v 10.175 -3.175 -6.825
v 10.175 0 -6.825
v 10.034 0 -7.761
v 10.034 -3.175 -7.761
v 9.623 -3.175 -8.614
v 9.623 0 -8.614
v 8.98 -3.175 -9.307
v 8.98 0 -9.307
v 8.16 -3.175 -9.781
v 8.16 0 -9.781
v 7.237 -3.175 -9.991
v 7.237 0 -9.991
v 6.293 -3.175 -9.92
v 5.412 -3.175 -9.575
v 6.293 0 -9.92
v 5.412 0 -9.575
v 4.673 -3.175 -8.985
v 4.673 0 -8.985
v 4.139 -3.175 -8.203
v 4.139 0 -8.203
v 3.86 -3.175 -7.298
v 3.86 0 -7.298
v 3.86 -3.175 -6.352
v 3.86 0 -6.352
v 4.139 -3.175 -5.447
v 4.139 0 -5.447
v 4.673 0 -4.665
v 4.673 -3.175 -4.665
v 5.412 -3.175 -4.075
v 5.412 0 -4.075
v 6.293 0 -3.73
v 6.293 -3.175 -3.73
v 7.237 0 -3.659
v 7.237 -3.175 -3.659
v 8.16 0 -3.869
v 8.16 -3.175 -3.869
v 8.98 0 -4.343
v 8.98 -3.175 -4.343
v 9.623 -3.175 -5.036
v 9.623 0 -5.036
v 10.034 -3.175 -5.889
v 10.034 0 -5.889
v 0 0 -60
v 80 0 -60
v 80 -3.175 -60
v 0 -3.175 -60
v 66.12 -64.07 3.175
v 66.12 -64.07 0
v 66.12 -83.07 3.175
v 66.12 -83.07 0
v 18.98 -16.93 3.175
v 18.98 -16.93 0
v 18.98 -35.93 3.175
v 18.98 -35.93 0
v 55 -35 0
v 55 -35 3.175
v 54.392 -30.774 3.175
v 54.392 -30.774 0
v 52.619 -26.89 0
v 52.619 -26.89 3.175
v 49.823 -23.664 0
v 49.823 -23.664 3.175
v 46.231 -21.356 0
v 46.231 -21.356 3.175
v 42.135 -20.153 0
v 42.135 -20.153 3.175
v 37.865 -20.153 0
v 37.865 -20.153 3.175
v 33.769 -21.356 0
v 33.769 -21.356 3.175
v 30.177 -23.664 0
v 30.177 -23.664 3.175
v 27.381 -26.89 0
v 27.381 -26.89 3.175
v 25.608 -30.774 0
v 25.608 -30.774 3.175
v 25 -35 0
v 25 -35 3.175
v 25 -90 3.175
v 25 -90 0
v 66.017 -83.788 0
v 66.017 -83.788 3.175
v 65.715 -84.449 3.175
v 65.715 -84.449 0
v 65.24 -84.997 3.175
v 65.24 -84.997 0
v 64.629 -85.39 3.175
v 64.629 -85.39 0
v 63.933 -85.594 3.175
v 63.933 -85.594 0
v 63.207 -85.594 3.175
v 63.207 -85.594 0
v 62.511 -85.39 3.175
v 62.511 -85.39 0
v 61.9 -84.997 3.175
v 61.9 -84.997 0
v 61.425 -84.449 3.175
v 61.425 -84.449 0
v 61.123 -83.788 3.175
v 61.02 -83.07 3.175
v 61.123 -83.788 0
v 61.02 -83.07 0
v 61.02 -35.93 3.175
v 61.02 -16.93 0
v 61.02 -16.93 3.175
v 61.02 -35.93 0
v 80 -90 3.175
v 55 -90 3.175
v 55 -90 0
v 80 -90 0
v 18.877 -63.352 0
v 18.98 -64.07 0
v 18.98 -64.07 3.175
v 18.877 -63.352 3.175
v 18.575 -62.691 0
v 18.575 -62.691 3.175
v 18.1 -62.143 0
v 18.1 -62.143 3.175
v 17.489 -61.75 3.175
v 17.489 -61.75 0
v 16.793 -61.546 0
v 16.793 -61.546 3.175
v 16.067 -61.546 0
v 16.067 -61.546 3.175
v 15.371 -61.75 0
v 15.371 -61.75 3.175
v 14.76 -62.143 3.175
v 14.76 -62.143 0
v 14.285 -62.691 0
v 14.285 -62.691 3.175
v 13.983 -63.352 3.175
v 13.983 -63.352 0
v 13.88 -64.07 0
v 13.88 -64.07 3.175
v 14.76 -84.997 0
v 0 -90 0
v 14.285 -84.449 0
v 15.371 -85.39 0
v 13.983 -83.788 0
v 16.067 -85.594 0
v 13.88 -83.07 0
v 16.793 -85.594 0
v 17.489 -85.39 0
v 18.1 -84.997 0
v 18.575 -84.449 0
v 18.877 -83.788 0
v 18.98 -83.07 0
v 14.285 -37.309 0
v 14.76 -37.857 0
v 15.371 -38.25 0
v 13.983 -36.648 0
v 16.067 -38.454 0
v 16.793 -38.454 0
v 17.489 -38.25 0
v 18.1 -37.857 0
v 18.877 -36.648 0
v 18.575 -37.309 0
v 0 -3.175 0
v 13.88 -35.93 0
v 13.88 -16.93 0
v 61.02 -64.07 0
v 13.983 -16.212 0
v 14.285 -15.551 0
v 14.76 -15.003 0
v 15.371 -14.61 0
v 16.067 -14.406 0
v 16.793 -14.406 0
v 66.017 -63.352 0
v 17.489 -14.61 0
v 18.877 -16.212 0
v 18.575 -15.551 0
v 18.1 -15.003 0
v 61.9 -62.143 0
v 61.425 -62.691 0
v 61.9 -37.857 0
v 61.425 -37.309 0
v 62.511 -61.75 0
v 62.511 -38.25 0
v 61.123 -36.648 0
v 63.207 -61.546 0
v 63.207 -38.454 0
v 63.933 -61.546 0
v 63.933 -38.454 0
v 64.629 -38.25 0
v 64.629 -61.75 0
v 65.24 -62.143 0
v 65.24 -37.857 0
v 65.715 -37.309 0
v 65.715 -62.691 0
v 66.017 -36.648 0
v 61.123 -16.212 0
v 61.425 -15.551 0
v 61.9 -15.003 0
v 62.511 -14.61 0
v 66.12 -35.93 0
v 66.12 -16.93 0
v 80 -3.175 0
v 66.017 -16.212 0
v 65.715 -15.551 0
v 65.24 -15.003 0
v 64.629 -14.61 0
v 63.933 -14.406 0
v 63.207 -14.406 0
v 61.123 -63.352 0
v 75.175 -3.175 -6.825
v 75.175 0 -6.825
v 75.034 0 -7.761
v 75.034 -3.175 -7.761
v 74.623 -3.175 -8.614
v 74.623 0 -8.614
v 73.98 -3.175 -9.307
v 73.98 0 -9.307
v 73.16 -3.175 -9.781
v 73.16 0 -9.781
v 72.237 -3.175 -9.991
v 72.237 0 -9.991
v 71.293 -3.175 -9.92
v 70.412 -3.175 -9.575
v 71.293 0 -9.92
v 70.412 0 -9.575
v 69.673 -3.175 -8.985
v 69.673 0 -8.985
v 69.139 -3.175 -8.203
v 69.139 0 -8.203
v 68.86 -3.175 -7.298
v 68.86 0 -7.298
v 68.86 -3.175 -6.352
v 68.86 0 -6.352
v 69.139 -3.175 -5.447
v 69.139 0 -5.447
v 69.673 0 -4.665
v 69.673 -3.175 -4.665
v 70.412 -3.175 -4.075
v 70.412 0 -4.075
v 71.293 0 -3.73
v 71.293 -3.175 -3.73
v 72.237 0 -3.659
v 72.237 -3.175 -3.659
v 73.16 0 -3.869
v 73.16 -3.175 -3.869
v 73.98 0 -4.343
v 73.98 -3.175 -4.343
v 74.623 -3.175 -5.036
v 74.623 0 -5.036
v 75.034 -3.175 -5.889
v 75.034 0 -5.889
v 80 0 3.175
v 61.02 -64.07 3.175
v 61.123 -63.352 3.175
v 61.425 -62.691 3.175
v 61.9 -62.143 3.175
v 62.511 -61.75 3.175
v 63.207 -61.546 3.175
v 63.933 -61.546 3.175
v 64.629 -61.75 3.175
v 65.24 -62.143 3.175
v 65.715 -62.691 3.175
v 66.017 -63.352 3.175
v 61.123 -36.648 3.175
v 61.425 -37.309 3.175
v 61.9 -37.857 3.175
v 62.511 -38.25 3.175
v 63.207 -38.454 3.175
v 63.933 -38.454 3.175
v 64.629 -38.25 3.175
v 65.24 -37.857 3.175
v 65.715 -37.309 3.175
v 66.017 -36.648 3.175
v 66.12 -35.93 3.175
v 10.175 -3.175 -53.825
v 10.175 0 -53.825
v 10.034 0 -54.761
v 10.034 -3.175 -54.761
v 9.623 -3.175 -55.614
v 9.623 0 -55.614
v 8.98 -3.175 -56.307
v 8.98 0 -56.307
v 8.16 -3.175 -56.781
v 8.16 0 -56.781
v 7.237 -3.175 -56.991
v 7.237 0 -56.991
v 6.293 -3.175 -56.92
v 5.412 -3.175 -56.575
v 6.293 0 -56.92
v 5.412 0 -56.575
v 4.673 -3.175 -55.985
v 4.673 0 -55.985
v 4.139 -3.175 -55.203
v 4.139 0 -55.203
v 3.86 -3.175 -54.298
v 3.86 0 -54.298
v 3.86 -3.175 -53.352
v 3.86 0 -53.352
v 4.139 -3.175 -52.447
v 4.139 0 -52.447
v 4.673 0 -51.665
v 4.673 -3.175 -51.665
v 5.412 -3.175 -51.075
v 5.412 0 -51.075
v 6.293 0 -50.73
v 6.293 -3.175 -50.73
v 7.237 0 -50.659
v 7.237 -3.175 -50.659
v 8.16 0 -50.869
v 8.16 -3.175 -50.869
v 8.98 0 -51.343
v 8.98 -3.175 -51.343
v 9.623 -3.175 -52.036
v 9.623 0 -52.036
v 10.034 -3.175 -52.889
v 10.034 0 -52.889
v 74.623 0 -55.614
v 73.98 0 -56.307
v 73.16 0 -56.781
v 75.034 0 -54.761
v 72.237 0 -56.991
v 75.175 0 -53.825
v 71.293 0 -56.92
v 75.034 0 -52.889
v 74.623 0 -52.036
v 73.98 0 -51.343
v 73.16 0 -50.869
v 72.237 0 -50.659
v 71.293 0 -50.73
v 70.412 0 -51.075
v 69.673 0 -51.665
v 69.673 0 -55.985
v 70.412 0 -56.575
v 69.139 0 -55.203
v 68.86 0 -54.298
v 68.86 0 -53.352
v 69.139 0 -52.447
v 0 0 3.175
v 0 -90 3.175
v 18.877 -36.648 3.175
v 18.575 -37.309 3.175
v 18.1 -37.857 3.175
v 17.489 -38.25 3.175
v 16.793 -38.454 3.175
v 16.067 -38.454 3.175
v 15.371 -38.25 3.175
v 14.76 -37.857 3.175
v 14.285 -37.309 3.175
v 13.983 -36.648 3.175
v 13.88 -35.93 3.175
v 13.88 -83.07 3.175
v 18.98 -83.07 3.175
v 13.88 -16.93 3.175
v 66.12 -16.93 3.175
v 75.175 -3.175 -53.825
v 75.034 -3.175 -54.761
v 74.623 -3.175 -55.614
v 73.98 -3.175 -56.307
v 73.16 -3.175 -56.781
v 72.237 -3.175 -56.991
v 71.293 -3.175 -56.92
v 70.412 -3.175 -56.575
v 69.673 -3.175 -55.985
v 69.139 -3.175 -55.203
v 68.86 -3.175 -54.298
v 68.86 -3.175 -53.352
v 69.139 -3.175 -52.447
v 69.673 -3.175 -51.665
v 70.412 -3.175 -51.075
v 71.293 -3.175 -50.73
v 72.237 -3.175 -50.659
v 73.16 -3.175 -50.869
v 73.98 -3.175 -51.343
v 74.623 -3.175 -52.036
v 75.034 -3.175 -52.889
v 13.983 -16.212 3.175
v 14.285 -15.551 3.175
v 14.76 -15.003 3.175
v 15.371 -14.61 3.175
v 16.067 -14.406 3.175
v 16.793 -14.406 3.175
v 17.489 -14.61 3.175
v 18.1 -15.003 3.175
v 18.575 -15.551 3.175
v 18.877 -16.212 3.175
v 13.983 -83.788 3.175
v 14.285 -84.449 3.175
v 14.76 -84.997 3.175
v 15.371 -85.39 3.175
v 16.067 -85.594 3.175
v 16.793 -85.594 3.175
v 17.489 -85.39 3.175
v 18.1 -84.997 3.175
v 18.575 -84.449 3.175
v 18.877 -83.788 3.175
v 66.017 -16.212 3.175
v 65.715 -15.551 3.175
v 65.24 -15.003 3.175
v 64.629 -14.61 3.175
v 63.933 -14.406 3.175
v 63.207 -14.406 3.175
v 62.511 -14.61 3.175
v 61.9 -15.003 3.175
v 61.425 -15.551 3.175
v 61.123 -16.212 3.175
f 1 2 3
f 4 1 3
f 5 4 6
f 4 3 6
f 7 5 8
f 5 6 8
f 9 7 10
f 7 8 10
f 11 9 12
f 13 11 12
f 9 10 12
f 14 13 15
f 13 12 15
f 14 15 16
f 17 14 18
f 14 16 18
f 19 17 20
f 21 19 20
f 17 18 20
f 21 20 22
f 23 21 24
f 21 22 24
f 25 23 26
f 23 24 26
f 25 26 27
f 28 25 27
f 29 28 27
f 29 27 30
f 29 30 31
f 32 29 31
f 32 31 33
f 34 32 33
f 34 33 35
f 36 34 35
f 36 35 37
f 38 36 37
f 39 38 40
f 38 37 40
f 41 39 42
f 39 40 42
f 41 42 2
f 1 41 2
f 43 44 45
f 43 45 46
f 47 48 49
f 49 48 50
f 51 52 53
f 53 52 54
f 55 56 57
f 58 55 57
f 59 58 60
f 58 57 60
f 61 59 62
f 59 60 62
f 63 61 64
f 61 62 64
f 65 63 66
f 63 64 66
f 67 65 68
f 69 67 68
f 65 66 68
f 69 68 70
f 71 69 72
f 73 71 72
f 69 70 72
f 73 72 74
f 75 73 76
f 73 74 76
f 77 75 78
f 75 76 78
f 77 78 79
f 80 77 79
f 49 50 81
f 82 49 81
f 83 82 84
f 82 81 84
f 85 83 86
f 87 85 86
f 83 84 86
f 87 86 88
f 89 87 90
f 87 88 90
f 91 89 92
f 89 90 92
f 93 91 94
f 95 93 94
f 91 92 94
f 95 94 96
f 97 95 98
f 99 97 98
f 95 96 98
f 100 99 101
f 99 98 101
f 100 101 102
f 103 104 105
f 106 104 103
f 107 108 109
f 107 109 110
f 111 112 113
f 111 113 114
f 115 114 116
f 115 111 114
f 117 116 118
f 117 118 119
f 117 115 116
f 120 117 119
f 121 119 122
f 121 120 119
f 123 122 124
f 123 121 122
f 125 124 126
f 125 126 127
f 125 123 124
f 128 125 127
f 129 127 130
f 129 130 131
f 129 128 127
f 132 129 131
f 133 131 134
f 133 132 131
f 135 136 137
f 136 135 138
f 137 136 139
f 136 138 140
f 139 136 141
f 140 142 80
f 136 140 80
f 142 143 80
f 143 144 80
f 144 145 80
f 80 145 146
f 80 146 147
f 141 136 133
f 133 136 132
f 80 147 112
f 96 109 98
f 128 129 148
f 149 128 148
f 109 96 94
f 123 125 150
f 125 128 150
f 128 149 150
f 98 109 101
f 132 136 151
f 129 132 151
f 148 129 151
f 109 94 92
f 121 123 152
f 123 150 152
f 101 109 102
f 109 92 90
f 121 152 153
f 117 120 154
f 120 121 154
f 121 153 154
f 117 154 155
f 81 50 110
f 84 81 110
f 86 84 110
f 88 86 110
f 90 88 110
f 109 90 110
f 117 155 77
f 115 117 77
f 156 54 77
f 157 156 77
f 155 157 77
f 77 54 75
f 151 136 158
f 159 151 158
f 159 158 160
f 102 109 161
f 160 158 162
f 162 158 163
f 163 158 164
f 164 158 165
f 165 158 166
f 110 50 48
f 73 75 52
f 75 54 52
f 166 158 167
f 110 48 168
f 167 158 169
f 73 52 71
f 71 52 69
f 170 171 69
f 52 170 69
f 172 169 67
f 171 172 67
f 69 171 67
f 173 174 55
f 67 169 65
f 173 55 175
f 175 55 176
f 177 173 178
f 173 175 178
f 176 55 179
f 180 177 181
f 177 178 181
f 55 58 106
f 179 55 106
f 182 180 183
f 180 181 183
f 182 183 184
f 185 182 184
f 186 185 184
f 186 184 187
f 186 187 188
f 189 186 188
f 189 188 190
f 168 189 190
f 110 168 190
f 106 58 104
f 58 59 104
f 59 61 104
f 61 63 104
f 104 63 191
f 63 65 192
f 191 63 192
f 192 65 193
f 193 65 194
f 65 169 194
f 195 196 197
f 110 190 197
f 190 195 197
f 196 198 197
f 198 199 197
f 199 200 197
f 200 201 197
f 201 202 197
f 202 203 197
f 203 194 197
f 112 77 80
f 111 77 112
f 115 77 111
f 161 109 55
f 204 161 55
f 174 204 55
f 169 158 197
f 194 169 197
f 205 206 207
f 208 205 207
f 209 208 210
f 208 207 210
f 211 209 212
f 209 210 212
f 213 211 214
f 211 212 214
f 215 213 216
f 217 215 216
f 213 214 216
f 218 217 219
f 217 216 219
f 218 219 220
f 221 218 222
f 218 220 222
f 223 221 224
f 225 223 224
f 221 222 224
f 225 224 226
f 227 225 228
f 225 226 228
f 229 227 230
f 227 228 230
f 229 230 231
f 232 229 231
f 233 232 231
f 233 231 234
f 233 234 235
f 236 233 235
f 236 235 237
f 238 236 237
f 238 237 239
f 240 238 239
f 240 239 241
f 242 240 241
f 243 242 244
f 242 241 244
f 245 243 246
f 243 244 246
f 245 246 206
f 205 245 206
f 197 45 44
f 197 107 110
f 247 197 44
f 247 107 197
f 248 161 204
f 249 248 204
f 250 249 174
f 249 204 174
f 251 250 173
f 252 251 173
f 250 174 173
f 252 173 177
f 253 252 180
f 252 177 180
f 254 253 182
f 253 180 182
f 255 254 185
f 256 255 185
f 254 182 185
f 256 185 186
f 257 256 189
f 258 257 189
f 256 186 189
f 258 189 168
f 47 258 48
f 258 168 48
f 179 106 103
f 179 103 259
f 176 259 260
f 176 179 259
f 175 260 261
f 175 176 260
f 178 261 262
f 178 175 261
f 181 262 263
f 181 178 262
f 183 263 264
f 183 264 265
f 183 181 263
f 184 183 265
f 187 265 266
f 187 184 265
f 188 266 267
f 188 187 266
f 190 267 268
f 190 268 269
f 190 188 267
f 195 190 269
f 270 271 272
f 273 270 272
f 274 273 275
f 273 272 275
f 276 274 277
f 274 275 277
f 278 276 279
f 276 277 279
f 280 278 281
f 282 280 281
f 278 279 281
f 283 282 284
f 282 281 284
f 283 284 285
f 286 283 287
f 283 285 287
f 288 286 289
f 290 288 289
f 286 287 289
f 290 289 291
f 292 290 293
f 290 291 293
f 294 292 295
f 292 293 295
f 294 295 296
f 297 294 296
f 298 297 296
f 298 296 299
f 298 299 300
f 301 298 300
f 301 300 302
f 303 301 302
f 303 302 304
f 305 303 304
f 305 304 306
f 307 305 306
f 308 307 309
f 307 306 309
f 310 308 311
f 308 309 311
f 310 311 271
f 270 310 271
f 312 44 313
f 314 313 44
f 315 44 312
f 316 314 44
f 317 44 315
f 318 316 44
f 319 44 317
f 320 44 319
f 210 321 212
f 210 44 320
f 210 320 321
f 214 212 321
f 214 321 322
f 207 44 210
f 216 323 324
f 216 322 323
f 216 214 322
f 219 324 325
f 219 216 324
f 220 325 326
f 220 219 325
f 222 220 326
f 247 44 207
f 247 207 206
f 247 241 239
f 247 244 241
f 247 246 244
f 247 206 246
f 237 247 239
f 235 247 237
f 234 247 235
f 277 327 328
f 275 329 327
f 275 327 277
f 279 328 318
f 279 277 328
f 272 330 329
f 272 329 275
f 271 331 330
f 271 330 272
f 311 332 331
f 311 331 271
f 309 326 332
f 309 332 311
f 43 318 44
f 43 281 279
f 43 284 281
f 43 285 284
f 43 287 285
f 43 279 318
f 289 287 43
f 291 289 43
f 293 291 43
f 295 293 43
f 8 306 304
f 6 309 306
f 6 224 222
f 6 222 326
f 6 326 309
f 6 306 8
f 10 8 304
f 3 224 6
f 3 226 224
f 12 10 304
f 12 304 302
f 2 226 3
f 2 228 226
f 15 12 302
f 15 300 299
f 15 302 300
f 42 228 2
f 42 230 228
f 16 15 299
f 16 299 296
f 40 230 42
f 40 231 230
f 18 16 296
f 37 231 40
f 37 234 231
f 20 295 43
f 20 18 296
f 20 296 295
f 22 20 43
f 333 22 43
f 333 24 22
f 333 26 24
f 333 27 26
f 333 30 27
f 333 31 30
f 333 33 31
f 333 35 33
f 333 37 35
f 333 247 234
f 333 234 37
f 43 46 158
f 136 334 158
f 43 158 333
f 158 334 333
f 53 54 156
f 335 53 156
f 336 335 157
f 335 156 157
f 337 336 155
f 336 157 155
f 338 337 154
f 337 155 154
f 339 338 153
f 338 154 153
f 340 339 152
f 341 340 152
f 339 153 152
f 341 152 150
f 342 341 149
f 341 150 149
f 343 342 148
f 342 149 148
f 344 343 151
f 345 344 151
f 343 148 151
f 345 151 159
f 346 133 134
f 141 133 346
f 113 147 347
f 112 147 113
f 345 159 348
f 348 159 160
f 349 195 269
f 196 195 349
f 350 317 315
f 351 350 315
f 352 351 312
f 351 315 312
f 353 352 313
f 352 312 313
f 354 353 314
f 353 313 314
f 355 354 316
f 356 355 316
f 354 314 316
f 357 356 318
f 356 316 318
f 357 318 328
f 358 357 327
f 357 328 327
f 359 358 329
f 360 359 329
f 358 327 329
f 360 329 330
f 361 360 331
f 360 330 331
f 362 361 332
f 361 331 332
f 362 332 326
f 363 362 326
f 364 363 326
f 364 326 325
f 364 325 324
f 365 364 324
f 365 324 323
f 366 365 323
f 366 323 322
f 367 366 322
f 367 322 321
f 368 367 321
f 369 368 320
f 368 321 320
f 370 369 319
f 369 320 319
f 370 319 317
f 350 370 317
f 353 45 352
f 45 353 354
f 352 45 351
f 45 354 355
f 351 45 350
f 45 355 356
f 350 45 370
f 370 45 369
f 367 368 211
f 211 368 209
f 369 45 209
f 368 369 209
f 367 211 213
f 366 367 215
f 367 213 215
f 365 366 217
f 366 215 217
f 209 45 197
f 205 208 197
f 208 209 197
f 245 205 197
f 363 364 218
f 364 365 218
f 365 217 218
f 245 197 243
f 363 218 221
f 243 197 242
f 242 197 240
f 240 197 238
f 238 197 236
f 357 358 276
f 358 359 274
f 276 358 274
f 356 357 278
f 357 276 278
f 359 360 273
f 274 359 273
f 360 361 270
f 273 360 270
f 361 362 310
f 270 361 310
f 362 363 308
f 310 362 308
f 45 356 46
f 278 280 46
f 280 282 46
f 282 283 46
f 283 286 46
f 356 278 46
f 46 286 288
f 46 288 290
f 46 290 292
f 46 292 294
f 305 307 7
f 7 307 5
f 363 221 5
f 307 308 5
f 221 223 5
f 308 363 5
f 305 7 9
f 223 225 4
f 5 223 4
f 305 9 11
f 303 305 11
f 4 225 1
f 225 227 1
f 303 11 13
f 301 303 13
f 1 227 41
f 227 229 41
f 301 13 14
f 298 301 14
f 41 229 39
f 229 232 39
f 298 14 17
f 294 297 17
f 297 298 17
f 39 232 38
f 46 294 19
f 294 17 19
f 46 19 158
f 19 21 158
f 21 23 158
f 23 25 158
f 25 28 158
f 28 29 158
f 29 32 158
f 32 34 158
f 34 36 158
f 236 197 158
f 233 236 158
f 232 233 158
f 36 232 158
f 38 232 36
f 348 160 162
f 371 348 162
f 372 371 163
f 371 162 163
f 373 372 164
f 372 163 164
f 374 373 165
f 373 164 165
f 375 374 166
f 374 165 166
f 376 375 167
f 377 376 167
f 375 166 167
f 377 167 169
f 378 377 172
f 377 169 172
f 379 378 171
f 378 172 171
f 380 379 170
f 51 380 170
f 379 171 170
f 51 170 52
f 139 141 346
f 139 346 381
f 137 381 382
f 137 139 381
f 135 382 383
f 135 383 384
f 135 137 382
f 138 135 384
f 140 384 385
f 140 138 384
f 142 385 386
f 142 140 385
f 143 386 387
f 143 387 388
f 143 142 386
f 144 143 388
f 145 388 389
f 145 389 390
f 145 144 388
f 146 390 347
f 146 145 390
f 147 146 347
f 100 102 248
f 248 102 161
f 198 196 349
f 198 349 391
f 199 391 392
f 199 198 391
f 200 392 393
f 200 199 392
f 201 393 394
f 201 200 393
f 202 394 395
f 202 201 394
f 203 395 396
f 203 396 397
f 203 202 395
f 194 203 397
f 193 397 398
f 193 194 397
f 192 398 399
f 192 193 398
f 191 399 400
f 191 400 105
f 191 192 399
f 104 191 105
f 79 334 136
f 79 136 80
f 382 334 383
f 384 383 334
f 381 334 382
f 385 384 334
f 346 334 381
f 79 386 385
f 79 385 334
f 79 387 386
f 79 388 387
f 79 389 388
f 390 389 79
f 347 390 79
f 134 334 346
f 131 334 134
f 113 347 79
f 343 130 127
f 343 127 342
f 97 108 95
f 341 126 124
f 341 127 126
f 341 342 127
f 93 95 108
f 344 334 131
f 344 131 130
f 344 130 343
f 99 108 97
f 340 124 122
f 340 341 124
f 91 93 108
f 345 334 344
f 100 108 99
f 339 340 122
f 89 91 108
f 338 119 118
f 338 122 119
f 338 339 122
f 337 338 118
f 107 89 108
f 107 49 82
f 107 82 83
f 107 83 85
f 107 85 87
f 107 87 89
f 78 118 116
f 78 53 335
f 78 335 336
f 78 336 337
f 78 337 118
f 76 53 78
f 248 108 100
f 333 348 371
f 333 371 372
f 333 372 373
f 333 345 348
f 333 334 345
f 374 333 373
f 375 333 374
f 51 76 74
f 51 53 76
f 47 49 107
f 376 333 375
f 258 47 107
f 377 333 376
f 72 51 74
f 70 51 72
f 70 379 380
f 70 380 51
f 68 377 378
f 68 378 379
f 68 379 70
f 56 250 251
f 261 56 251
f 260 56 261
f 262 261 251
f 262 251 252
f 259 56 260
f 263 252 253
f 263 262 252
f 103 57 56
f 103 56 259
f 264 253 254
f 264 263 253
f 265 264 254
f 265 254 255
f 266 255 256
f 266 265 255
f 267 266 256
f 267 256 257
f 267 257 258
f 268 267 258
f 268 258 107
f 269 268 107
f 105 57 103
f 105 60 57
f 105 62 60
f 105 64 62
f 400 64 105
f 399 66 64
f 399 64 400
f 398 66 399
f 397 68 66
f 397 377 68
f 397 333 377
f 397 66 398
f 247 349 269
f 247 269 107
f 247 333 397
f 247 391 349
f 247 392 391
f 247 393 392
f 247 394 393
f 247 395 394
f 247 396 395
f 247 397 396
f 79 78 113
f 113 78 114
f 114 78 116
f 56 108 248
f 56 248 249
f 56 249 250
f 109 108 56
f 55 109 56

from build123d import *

# Parameters (mm, degrees)
SKETCH1_W           = 80
SKETCH1_H           = 100
BOSS_EXTRUDE1_DEPTH = 3.175
CUT_EXTRUDE2_REACH  = 5.175
SKETCH4_W           = 80
SKETCH4_H           = 3.175
BOSS_EXTRUDE2_DEPTH = 60
SKETCH5_R           = 3.175
CUT_EXTRUDE3_DEPTH  = 3.175
SKETCH6_W           = 80
SKETCH6_H           = 10
CUT_EXTRUDE4_DEPTH  = 64.175


with BuildPart() as part:
    # Sketch1 → Boss-Extrude1 (new body)
    with BuildSketch(Plane.XY):
        with Locations((40, -50)):
            Rectangle(SKETCH1_W, SKETCH1_H)
        with BuildLine():
            Line((18.98, -16.93), (18.98, -35.93))
            ThreePointArc((18.98, -35.93), (16.43, -38.48), (13.88, -35.93))
            Line((13.88, -35.93), (13.88, -16.93))
            ThreePointArc((13.88, -16.93), (16.43, -14.38), (18.98, -16.93))
        make_face(mode=Mode.SUBTRACT)
        with BuildLine():
            Line((61.02, -16.93), (61.02, -35.93))
            ThreePointArc((61.02, -35.93), (63.57, -38.48), (66.12, -35.93))
            Line((66.12, -35.93), (66.12, -16.93))
            ThreePointArc((66.12, -16.93), (63.57, -14.38), (61.02, -16.93))
        make_face(mode=Mode.SUBTRACT)
        with BuildLine():
            Line((18.98, -83.07), (18.98, -64.07))
            ThreePointArc((18.98, -64.07), (16.43, -61.52), (13.88, -64.07))
            Line((13.88, -64.07), (13.88, -83.07))
            ThreePointArc((13.88, -83.07), (16.43, -85.62), (18.98, -83.07))
        make_face(mode=Mode.SUBTRACT)
        with BuildLine():
            Line((61.02, -83.07), (61.02, -64.07))
            ThreePointArc((61.02, -64.07), (63.57, -61.52), (66.12, -64.07))
            Line((66.12, -64.07), (66.12, -83.07))
            ThreePointArc((66.12, -83.07), (63.57, -85.62), (61.02, -83.07))
        make_face(mode=Mode.SUBTRACT)
    extrude(amount=BOSS_EXTRUDE1_DEPTH)

    # Sketch2 → Cut-Extrude2 (cut, up to next)
    with BuildSketch(Plane.XY.offset(3.175), mode=Mode.PRIVATE) as cut_extrude2_sk1:
        with BuildLine():
            Line((25, -35), (25, -100))
            Line((25, -100), (55, -100))
            Line((55, -100), (55, -35))
            ThreePointArc((55, -35), (40, -20), (25, -35))
        make_face()
    cut_extrude2_tool1 = extrude(cut_extrude2_sk1.sketch, amount=-CUT_EXTRUDE2_REACH, mode=Mode.PRIVATE) & part.part
    add(cut_extrude2_tool1.solids().sort_by_distance((40, -61.536522, 3.175))[0], mode=Mode.SUBTRACT)

    # Sketch4 → Boss-Extrude2 (add)
    with BuildSketch(Plane(origin=(0, 0, 0), x_dir=(-1, 0, 0), z_dir=(0, 0, -1))):
        with Locations((-40, -1.5875)):
            Rectangle(SKETCH4_W, SKETCH4_H)
    extrude(amount=BOSS_EXTRUDE2_DEPTH)

    # Sketch5 → Cut-Extrude3 (cut)
    with BuildSketch(Plane(origin=(0, 0, 0), x_dir=(1, 0, 0), z_dir=(0, 1, 0))):
        with Locations((7, 53.825)):
            Circle(SKETCH5_R)
        with Locations((7, 6.825)):
            Circle(SKETCH5_R)
        with Locations((72, 53.825)):
            Circle(SKETCH5_R)
        with Locations((72, 6.825)):
            Circle(SKETCH5_R)
    extrude(amount=-CUT_EXTRUDE3_DEPTH, mode=Mode.SUBTRACT)

    # Sketch6 → Cut-Extrude4 (cut, through all)
    with BuildSketch(Plane.XY.offset(3.175)):
        with Locations((40, -95)):
            Rectangle(SKETCH6_W, SKETCH6_H)
    extrude(amount=-CUT_EXTRUDE4_DEPTH, mode=Mode.SUBTRACT)


solid = part.part
